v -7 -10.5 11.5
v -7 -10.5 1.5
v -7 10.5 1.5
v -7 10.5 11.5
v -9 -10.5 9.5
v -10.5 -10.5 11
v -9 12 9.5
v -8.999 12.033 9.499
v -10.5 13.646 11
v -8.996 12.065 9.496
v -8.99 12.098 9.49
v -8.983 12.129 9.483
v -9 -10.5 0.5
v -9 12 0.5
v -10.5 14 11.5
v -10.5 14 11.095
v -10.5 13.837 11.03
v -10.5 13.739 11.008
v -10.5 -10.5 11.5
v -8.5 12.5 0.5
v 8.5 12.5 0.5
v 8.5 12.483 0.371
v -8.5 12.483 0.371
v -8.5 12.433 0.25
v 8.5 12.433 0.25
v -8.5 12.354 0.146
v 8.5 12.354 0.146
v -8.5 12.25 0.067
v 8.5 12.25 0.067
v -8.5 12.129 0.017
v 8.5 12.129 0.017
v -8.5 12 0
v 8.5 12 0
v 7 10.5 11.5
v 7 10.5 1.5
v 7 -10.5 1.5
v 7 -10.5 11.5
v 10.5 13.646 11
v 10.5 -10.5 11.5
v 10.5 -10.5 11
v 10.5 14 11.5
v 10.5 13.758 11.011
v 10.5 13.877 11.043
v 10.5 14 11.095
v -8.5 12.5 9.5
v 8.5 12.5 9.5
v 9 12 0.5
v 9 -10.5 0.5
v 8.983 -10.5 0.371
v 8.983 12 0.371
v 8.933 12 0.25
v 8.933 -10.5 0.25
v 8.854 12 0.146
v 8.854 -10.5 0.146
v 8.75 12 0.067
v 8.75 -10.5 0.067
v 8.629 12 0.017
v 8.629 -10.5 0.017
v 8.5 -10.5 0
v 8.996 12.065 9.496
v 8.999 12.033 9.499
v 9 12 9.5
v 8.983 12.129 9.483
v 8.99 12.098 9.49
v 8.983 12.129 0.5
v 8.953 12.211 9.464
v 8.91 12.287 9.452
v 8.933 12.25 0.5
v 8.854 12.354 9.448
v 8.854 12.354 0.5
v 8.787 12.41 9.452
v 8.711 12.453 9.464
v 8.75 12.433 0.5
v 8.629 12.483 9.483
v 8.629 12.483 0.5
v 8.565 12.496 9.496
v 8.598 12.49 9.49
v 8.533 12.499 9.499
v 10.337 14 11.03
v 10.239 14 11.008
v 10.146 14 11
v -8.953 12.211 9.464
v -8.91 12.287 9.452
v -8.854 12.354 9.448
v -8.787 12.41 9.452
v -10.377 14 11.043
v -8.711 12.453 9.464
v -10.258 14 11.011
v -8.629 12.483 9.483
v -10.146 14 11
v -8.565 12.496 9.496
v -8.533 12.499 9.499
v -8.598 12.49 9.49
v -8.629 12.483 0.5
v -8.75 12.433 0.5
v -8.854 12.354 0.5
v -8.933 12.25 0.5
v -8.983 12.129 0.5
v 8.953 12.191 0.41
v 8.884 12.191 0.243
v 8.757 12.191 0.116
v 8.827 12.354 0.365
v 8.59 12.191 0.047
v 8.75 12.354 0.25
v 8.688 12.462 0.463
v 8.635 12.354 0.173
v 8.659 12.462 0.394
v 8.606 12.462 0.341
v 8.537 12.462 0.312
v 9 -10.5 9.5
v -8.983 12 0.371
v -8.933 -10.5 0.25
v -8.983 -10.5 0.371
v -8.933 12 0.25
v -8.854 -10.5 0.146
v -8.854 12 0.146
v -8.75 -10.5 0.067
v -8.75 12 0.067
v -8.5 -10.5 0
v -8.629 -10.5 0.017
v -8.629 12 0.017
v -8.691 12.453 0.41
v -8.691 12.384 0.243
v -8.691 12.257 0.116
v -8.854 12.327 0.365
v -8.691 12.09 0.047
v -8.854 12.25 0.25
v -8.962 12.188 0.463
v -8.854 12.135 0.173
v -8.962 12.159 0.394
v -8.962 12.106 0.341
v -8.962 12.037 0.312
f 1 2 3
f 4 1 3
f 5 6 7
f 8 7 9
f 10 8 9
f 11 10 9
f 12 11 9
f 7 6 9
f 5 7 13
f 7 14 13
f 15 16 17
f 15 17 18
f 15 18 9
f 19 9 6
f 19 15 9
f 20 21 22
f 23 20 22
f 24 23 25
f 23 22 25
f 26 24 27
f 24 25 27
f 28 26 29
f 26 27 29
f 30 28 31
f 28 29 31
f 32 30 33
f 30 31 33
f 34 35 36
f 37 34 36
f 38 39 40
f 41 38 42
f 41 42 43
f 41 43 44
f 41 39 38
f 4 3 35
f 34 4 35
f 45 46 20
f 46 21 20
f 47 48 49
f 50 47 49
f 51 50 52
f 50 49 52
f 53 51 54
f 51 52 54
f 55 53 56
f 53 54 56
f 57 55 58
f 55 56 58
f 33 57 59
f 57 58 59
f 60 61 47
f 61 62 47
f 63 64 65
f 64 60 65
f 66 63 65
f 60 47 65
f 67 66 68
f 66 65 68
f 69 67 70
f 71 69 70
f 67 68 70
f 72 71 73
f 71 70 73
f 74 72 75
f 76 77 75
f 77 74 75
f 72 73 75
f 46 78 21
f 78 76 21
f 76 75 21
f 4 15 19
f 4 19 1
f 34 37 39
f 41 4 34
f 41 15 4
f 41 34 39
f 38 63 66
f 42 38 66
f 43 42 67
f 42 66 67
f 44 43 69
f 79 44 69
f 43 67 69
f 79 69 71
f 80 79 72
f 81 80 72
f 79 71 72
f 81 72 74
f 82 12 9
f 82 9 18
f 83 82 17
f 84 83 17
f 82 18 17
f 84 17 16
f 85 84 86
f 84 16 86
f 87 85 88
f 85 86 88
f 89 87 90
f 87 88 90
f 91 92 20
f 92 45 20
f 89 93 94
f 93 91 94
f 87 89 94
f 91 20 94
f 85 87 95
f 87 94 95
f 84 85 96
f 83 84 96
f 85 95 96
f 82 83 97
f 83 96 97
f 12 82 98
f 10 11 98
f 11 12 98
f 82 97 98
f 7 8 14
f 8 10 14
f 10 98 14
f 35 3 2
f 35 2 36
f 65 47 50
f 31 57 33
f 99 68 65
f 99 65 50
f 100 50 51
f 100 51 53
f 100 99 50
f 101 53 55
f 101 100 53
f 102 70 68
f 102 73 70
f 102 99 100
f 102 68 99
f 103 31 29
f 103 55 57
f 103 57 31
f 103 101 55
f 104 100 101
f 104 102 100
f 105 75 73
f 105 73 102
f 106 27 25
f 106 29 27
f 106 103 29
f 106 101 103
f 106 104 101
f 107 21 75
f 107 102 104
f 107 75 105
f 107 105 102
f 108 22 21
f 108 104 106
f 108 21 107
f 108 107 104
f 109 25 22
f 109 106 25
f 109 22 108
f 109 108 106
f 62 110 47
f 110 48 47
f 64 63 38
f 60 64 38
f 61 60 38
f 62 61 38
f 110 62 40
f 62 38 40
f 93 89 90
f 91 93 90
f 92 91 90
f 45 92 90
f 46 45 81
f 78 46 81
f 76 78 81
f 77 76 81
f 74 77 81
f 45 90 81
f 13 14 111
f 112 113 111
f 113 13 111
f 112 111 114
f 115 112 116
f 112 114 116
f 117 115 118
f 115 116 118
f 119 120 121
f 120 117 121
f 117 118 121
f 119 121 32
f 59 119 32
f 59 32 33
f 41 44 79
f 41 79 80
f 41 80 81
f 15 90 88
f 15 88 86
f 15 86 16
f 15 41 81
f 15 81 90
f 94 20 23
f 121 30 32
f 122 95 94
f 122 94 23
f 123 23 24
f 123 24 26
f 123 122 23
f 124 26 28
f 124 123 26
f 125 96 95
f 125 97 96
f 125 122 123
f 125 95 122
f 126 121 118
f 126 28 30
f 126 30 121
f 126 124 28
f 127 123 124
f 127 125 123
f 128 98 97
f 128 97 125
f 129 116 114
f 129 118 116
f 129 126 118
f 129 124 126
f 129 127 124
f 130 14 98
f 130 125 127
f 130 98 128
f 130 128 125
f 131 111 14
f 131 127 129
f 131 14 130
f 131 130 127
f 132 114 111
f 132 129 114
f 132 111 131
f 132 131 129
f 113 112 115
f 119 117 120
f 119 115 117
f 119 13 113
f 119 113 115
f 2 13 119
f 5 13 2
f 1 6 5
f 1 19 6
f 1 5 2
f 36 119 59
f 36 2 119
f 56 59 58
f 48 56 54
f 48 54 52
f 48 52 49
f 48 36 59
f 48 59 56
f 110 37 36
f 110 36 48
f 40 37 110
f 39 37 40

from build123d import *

# Parameters (mm, degrees)
SKETCH1_W           = 14
SKETCH1_H           = 21
BOSS_EXTRUDE1_DEPTH = 1.5
BOSS_EXTRUDE2_DEPTH = 11.5
BOSS_EXTRUDE3_DEPTH = 0.5
CHAMFER1_SIZE       = 1.5
FILLET1_R           = 0.5


# Some blends are built 0.0001 mm under size
with BuildPart() as part:
    # Sketch1 → Boss-Extrude1 (new body)
    with BuildSketch(Plane.XY):
        Rectangle(SKETCH1_W, SKETCH1_H)
    extrude(amount=BOSS_EXTRUDE1_DEPTH)

    # Sketch1<4> → Boss-Extrude2 (add)
    with BuildSketch(Plane.XY):
        Polygon((-9, 12.5), (-9, -10.5), (-7, -10.5), (-7, 10.5), (7, 10.5), (7, -10.5), (9, -10.5), (9, 12.5), align=None)
    extrude(amount=BOSS_EXTRUDE2_DEPTH)

    # Sketch2 → Boss-Extrude3 (add)
    with BuildSketch(Plane.XY.offset(11.5)):
        Polygon((-9, -10.5), (-9, 12.5), (9, 12.5), (9, -10.5), (10.5, -10.5), (10.5, 14), (-10.5, 14), (-10.5, -10.5), align=None)
    extrude(amount=-BOSS_EXTRUDE3_DEPTH)

    # Chamfer1
    chamfer1_edges = [part.edges().sort_by_distance(p)[0] for p in [
        (-9, 1, 11),
        (0, 12.5, 11),
        (9, 1, 11),
    ]]
    chamfer(chamfer1_edges, length=CHAMFER1_SIZE - 0.0001)  # a hair under: the kernel refuses the full size

    # Fillet1
    # the kernel refuses this fillet: 0.5 mm, written as the material it takes off along each edge
    with BuildSketch(Plane(origin=(8.5, 12, 0.5), x_dir=(0, 0, -1), z_dir=(0, 1, 0))) as fillet1_piece_1_section:
        Polygon((0, 0), (FILLET1_R * 1.02, 0), (FILLET1_R * 1.02, -FILLET1_R * 1.02), (0, -FILLET1_R * 1.02), align=None)
    fillet1_piece_1 = extrude(amount=FILLET1_R * 1.02, mode=Mode.PRIVATE)
    fillet1_piece_1 = fillet1_piece_1 - Plane(origin=(8.5, 12, 0.5), x_dir=(-0.7071067811865475, 0, 0.7071067811865475), z_dir=(0, 1, 0)) * Sphere(FILLET1_R, mode=Mode.PRIVATE)
    add(fillet1_piece_1, mode=Mode.SUBTRACT)
    with BuildSketch(Plane(origin=(-8.5, 12, 0.5), x_dir=(0, 0, -1), z_dir=(-1, 0, 0))) as fillet1_piece_2_section:
        Polygon((0, 0), (FILLET1_R * 1.02, 0), (FILLET1_R * 1.02, -FILLET1_R * 1.02), (0, -FILLET1_R * 1.02), align=None)
    fillet1_piece_2 = extrude(amount=FILLET1_R * 1.02, mode=Mode.PRIVATE)
    fillet1_piece_2 = fillet1_piece_2 - Plane(origin=(-8.5, 12, 0.5), x_dir=(0, -0.7071067811865475, 0.7071067811865475), z_dir=(-1, 0, 0)) * Sphere(FILLET1_R, mode=Mode.PRIVATE)
    add(fillet1_piece_2, mode=Mode.SUBTRACT)
    with BuildSketch(Plane(origin=(9, -11.75, 0), x_dir=(-1, 0, 0), z_dir=(0, 1, 0))) as fillet1_piece_3:
        with BuildLine():
            CenterArc((FILLET1_R, FILLET1_R), FILLET1_R, 180, 90)
            Line((0, FILLET1_R), (-FILLET1_R * 0.02, FILLET1_R))
            Line((-FILLET1_R * 0.02, FILLET1_R), (-FILLET1_R * 0.02, -FILLET1_R * 0.02))
            Line((-FILLET1_R * 0.02, -FILLET1_R * 0.02), (FILLET1_R, -FILLET1_R * 0.02))
            Line((FILLET1_R, -FILLET1_R * 0.02), (FILLET1_R, 0))
        make_face()
    extrude(amount=23.75, mode=Mode.SUBTRACT)
    with BuildSketch(Plane(origin=(-9, 12, 0), x_dir=(0, 0, 1), z_dir=(0, -1, 0))) as fillet1_piece_4:
        with BuildLine():
            CenterArc((FILLET1_R, -FILLET1_R), FILLET1_R, 90, 90)
            Line((0, -FILLET1_R), (-FILLET1_R * 0.02, -FILLET1_R))
            Line((-FILLET1_R * 0.02, -FILLET1_R), (-FILLET1_R * 0.02, FILLET1_R * 0.02))
            Line((-FILLET1_R * 0.02, FILLET1_R * 0.02), (FILLET1_R, FILLET1_R * 0.02))
            Line((FILLET1_R, FILLET1_R * 0.02), (FILLET1_R, 0))
        make_face()
    extrude(amount=23.75, mode=Mode.SUBTRACT)
    with BuildSketch(Plane(origin=(8.5, 12.5, 0), x_dir=(0, -1, 0), z_dir=(-1, 0, 0))) as fillet1_piece_5:
        with BuildLine():
            CenterArc((FILLET1_R, FILLET1_R), FILLET1_R, 180, 90)
            Line((0, FILLET1_R), (-FILLET1_R * 0.02, FILLET1_R))
            Line((-FILLET1_R * 0.02, FILLET1_R), (-FILLET1_R * 0.02, -FILLET1_R * 0.02))
            Line((-FILLET1_R * 0.02, -FILLET1_R * 0.02), (FILLET1_R, -FILLET1_R * 0.02))
            Line((FILLET1_R, -FILLET1_R * 0.02), (FILLET1_R, 0))
        make_face()
    extrude(amount=17, mode=Mode.SUBTRACT)
    with BuildSketch(Plane(origin=(-9, 12.5, 0.5), x_dir=(0, -1, 0), z_dir=(0, 0, 1))) as fillet1_piece_6_section:
        with BuildLine():
            CenterArc((FILLET1_R, FILLET1_R), FILLET1_R, 180, 90)
            Line((0, FILLET1_R), (-FILLET1_R * 0.02, FILLET1_R))
            Line((-FILLET1_R * 0.02, FILLET1_R), (-FILLET1_R * 0.02, -FILLET1_R * 0.02))
            Line((-FILLET1_R * 0.02, -FILLET1_R * 0.02), (FILLET1_R, -FILLET1_R * 0.02))
            Line((FILLET1_R, -FILLET1_R * 0.02), (FILLET1_R, 0))
        make_face()
    fillet1_piece_6 = extrude(amount=10.2501, mode=Mode.PRIVATE)
    fillet1_piece_6 = split(fillet1_piece_6, bisect_by=Plane(origin=(-6.646616443, 12.387329395, 7.146716443), z_dir=(-0.7071067811865476, 0, -0.7071067811865476)), keep=Keep.TOP, mode=Mode.PRIVATE)
    fillet1_piece_6 = split(fillet1_piece_6, bisect_by=Plane(origin=(-8.887329395, 10.146616443, 7.146716443), z_dir=(0, 0.7071067811865476, -0.7071067811865476)), keep=Keep.TOP, mode=Mode.PRIVATE)
    add(fillet1_piece_6, mode=Mode.SUBTRACT)
    with BuildSketch(Plane(origin=(-9, 12.5, 0.5), x_dir=(0, -1, 0), z_dir=(0, 0, 1))) as fillet1_piece_7_section:
        with BuildLine():
            CenterArc((FILLET1_R, FILLET1_R), FILLET1_R, 180, 90)
            Line((0, FILLET1_R), (-FILLET1_R * 0.02, FILLET1_R))
            Line((-FILLET1_R * 0.02, FILLET1_R), (-FILLET1_R * 0.02, -FILLET1_R * 0.02))
            Line((-FILLET1_R * 0.02, -FILLET1_R * 0.02), (FILLET1_R, -FILLET1_R * 0.02))
            Line((FILLET1_R, -FILLET1_R * 0.02), (FILLET1_R, 0))
        make_face()
    fillet1_piece_7 = extrude(amount=10.2501, mode=Mode.PRIVATE)
    fillet1_piece_7 = split(fillet1_piece_7, bisect_by=Plane(origin=(-8.796279433, 12.478509021, 9.296379433), z_dir=(0.7071067811865476, 0, 0.7071067811865476)), keep=Keep.TOP, mode=Mode.PRIVATE)
    fillet1_piece_7 = split(fillet1_piece_7, bisect_by=Plane(origin=(-8.735536236, 12.417765825, 9.417865825), z_dir=(0, 0.7071067811865476, -0.7071067811865476)), keep=Keep.TOP, mode=Mode.PRIVATE)
    add(fillet1_piece_7, mode=Mode.SUBTRACT)
    with BuildSketch(Plane(origin=(-9, 12.5, 0.5), x_dir=(0, -1, 0), z_dir=(0, 0, 1))) as fillet1_piece_8_section:
        with BuildLine():
            CenterArc((FILLET1_R, FILLET1_R), FILLET1_R, 180, 90)
            Line((0, FILLET1_R), (-FILLET1_R * 0.02, FILLET1_R))
            Line((-FILLET1_R * 0.02, FILLET1_R), (-FILLET1_R * 0.02, -FILLET1_R * 0.02))
            Line((-FILLET1_R * 0.02, -FILLET1_R * 0.02), (FILLET1_R, -FILLET1_R * 0.02))
            Line((FILLET1_R, -FILLET1_R * 0.02), (FILLET1_R, 0))
        make_face()
    fillet1_piece_8 = extrude(amount=10.2501, mode=Mode.PRIVATE)
    fillet1_piece_8 = split(fillet1_piece_8, bisect_by=Plane(origin=(-8.917765825, 12.235536236, 9.417865825), z_dir=(-0.7071067811865476, 0, -0.7071067811865476)), keep=Keep.TOP, mode=Mode.PRIVATE)
    fillet1_piece_8 = split(fillet1_piece_8, bisect_by=Plane(origin=(-8.978509021, 12.296279433, 9.296379433), z_dir=(0, -0.7071067811865476, 0.7071067811865476)), keep=Keep.TOP, mode=Mode.PRIVATE)
    add(fillet1_piece_8, mode=Mode.SUBTRACT)
    with BuildSketch(Plane(origin=(9, 12.5, 0.5), x_dir=(0, -1, 0), z_dir=(0, 0, 1))) as fillet1_piece_9_section:
        with BuildLine():
            CenterArc((FILLET1_R, -FILLET1_R), FILLET1_R, 90, 90)
            Line((0, -FILLET1_R), (-FILLET1_R * 0.02, -FILLET1_R))
            Line((-FILLET1_R * 0.02, -FILLET1_R), (-FILLET1_R * 0.02, FILLET1_R * 0.02))
            Line((-FILLET1_R * 0.02, FILLET1_R * 0.02), (FILLET1_R, FILLET1_R * 0.02))
            Line((FILLET1_R, FILLET1_R * 0.02), (FILLET1_R, 0))
        make_face()
    fillet1_piece_9 = extrude(amount=10.2501, mode=Mode.PRIVATE)
    fillet1_piece_9 = split(fillet1_piece_9, bisect_by=Plane(origin=(6.646616443, 12.387329395, 7.146716443), z_dir=(0.7071067811865476, 0, -0.7071067811865476)), keep=Keep.TOP, mode=Mode.PRIVATE)
    fillet1_piece_9 = split(fillet1_piece_9, bisect_by=Plane(origin=(8.887329395, 10.146616443, 7.146716443), z_dir=(0, 0.7071067811865476, -0.7071067811865476)), keep=Keep.TOP, mode=Mode.PRIVATE)
    add(fillet1_piece_9, mode=Mode.SUBTRACT)
    with BuildSketch(Plane(origin=(9, 12.5, 0.5), x_dir=(0, -1, 0), z_dir=(0, 0, 1))) as fillet1_piece_10_section:
        with BuildLine():
            CenterArc((FILLET1_R, -FILLET1_R), FILLET1_R, 90, 90)
            Line((0, -FILLET1_R), (-FILLET1_R * 0.02, -FILLET1_R))
            Line((-FILLET1_R * 0.02, -FILLET1_R), (-FILLET1_R * 0.02, FILLET1_R * 0.02))
            Line((-FILLET1_R * 0.02, FILLET1_R * 0.02), (FILLET1_R, FILLET1_R * 0.02))
            Line((FILLET1_R, FILLET1_R * 0.02), (FILLET1_R, 0))
        make_face()
    fillet1_piece_10 = extrude(amount=10.2501, mode=Mode.PRIVATE)
    fillet1_piece_10 = split(fillet1_piece_10, bisect_by=Plane(origin=(8.796279433, 12.478509021, 9.296379433), z_dir=(-0.7071067811865476, 0, 0.7071067811865476)), keep=Keep.TOP, mode=Mode.PRIVATE)
    fillet1_piece_10 = split(fillet1_piece_10, bisect_by=Plane(origin=(8.735536236, 12.417765825, 9.417865825), z_dir=(0, 0.7071067811865476, -0.7071067811865476)), keep=Keep.TOP, mode=Mode.PRIVATE)
    add(fillet1_piece_10, mode=Mode.SUBTRACT)
    with BuildSketch(Plane(origin=(9, 12.5, 0.5), x_dir=(0, -1, 0), z_dir=(0, 0, 1))) as fillet1_piece_11_section:
        with BuildLine():
            CenterArc((FILLET1_R, -FILLET1_R), FILLET1_R, 90, 90)
            Line((0, -FILLET1_R), (-FILLET1_R * 0.02, -FILLET1_R))
            Line((-FILLET1_R * 0.02, -FILLET1_R), (-FILLET1_R * 0.02, FILLET1_R * 0.02))
            Line((-FILLET1_R * 0.02, FILLET1_R * 0.02), (FILLET1_R, FILLET1_R * 0.02))
            Line((FILLET1_R, FILLET1_R * 0.02), (FILLET1_R, 0))
        make_face()
    fillet1_piece_11 = extrude(amount=10.2501, mode=Mode.PRIVATE)
    fillet1_piece_11 = split(fillet1_piece_11, bisect_by=Plane(origin=(8.917765825, 12.235536236, 9.417865825), z_dir=(0.7071067811865476, 0, -0.7071067811865476)), keep=Keep.TOP, mode=Mode.PRIVATE)
    fillet1_piece_11 = split(fillet1_piece_11, bisect_by=Plane(origin=(8.978509021, 12.296279433, 9.296379433), z_dir=(0, -0.7071067811865476, 0.7071067811865476)), keep=Keep.TOP, mode=Mode.PRIVATE)
    add(fillet1_piece_11, mode=Mode.SUBTRACT)
    with BuildSketch(Plane(origin=(8.583333333, 12.083333333, 9.083433333), x_dir=(0.408248290463863, -0.816496580927726, 0.408248290463863), z_dir=(0.5773502691896258, 0.5773502691896258, 0.5773502691896258))) as fillet1_piece_12_section:
        with BuildLine():
            CenterArc((FILLET1_R * 0.57735026919, -FILLET1_R), FILLET1_R, 90, 60)
            Line((-FILLET1_R * 0.288675134595, -FILLET1_R * 0.5), (-FILLET1_R * 0.305995642671, -FILLET1_R * 0.49))
            Line((-FILLET1_R * 0.305995642671, -FILLET1_R * 0.49), (-FILLET1_R * 0.0115470053838, FILLET1_R * 0.02))
            Line((-FILLET1_R * 0.0115470053838, FILLET1_R * 0.02), (FILLET1_R * 0.57735026919, FILLET1_R * 0.02))
            Line((FILLET1_R * 0.57735026919, FILLET1_R * 0.02), (FILLET1_R * 0.57735026919, 0))
        make_face()
    fillet1_piece_12 = extrude(amount=4.041278679, mode=Mode.PRIVATE)
    fillet1_piece_12 = split(fillet1_piece_12, bisect_by=Plane(origin=(9, 12.593724218, 9.60103013), z_dir=(-1, 0, 0)), keep=Keep.TOP, mode=Mode.PRIVATE)
    fillet1_piece_12 = split(fillet1_piece_12, bisect_by=Plane(origin=(8.906275782, 12.5, 9.60103013), z_dir=(0, 1, 0)), keep=Keep.TOP, mode=Mode.PRIVATE)
    add(fillet1_piece_12, mode=Mode.SUBTRACT)
    with BuildSketch(Plane(origin=(8.583333333, 12.083333333, 9.083433333), x_dir=(0.408248290463863, -0.816496580927726, 0.408248290463863), z_dir=(0.5773502691896258, 0.5773502691896258, 0.5773502691896258))) as fillet1_piece_13_section:
        with BuildLine():
            CenterArc((FILLET1_R * 0.57735026919, -FILLET1_R), FILLET1_R, 90, 60)
            Line((-FILLET1_R * 0.288675134595, -FILLET1_R * 0.5), (-FILLET1_R * 0.305995642671, -FILLET1_R * 0.49))
            Line((-FILLET1_R * 0.305995642671, -FILLET1_R * 0.49), (-FILLET1_R * 0.0115470053838, FILLET1_R * 0.02))
            Line((-FILLET1_R * 0.0115470053838, FILLET1_R * 0.02), (FILLET1_R * 0.57735026919, FILLET1_R * 0.02))
            Line((FILLET1_R * 0.57735026919, FILLET1_R * 0.02), (FILLET1_R * 0.57735026919, 0))
        make_face()
    fillet1_piece_13 = extrude(amount=4.041278679, mode=Mode.PRIVATE)
    fillet1_piece_13 = split(fillet1_piece_13, bisect_by=Plane(origin=(9, 12.406275782, 9.60103013), z_dir=(1, 0, 0)), keep=Keep.TOP, mode=Mode.PRIVATE)
    fillet1_piece_13 = split(fillet1_piece_13, bisect_by=Plane(origin=(9.093724218, 12.5, 9.60103013), z_dir=(0, -1, 0)), keep=Keep.TOP, mode=Mode.PRIVATE)
    add(fillet1_piece_13, mode=Mode.SUBTRACT)
    with BuildSketch(Plane(origin=(8.583333333, 12.083333333, 9.083433333), x_dir=(0.408248290463863, -0.816496580927726, 0.408248290463863), z_dir=(0.5773502691896258, 0.5773502691896258, 0.5773502691896258))) as fillet1_piece_14_section:
        with BuildLine():
            CenterArc((FILLET1_R * 0.57735026919, -FILLET1_R), FILLET1_R, 90, 60)
            Line((-FILLET1_R * 0.288675134595, -FILLET1_R * 0.5), (-FILLET1_R * 0.305995642671, -FILLET1_R * 0.49))
            Line((-FILLET1_R * 0.305995642671, -FILLET1_R * 0.49), (-FILLET1_R * 0.0115470053838, FILLET1_R * 0.02))
            Line((-FILLET1_R * 0.0115470053838, FILLET1_R * 0.02), (FILLET1_R * 0.57735026919, FILLET1_R * 0.02))
            Line((FILLET1_R * 0.57735026919, FILLET1_R * 0.02), (FILLET1_R * 0.57735026919, 0))
        make_face()
    fillet1_piece_14 = extrude(amount=4.041278679, mode=Mode.PRIVATE)
    fillet1_piece_14 = split(fillet1_piece_14, bisect_by=Plane(origin=(9.74076552, 13.24076552, 11), z_dir=(0, 0, -1)), keep=Keep.TOP, mode=Mode.PRIVATE)
    fillet1_piece_14 = split(fillet1_piece_14, bisect_by=Plane(origin=(9, 13.24076552, 10.315388184), z_dir=(1, 0, 0)), keep=Keep.TOP, mode=Mode.PRIVATE)
    fillet1_piece_14 = split(fillet1_piece_14, bisect_by=Plane(origin=(9.74076552, 12.5, 10.315388184), z_dir=(0, 1, 0)), keep=Keep.TOP, mode=Mode.PRIVATE)
    add(fillet1_piece_14, mode=Mode.SUBTRACT)
    with BuildSketch(Plane(origin=(8.583333333, 12.083333333, 9.083433333), x_dir=(0.408248290463863, -0.816496580927726, 0.408248290463863), z_dir=(0.5773502691896258, 0.5773502691896258, 0.5773502691896258))) as fillet1_piece_15_section:
        with BuildLine():
            CenterArc((FILLET1_R * 0.57735026919, -FILLET1_R), FILLET1_R, 90, 60)
            Line((-FILLET1_R * 0.288675134595, -FILLET1_R * 0.5), (-FILLET1_R * 0.305995642671, -FILLET1_R * 0.49))
            Line((-FILLET1_R * 0.305995642671, -FILLET1_R * 0.49), (-FILLET1_R * 0.0115470053838, FILLET1_R * 0.02))
            Line((-FILLET1_R * 0.0115470053838, FILLET1_R * 0.02), (FILLET1_R * 0.57735026919, FILLET1_R * 0.02))
            Line((FILLET1_R * 0.57735026919, FILLET1_R * 0.02), (FILLET1_R * 0.57735026919, 0))
        make_face()
    fillet1_piece_15 = extrude(amount=4.041278679, mode=Mode.PRIVATE)
    fillet1_piece_15 = split(fillet1_piece_15, bisect_by=Plane(origin=(10.655826111, 14.155826111, 11), z_dir=(0, 0, 1)), keep=Keep.TOP, mode=Mode.PRIVATE)
    add(fillet1_piece_15, mode=Mode.SUBTRACT)
    with BuildSketch(Plane(origin=(-10.916566667, 14.416566667, 11.416666667), x_dir=(-0.40824829046386607, -0.816496580927726, 0.4082482904638599), z_dir=(0.5773502691896258, -0.5773502691896258, -0.5773502691896258))) as fillet1_piece_16_section:
        with BuildLine():
            CenterArc((FILLET1_R * 0.57735026919, -FILLET1_R), FILLET1_R, 90, 60)
            Line((-FILLET1_R * 0.288675134595, -FILLET1_R * 0.5), (-FILLET1_R * 0.305995642671, -FILLET1_R * 0.49))
            Line((-FILLET1_R * 0.305995642671, -FILLET1_R * 0.49), (-FILLET1_R * 0.0115470053838, FILLET1_R * 0.02))
            Line((-FILLET1_R * 0.0115470053838, FILLET1_R * 0.02), (FILLET1_R * 0.57735026919, FILLET1_R * 0.02))
            Line((FILLET1_R * 0.57735026919, FILLET1_R * 0.02), (FILLET1_R * 0.57735026919, 0))
        make_face()
    fillet1_piece_16 = extrude(amount=4.041278679, mode=Mode.PRIVATE)
    fillet1_piece_16 = split(fillet1_piece_16, bisect_by=Plane(origin=(-10.655826111, 14.155826111, 11), z_dir=(0, 0, 1)), keep=Keep.TOP, mode=Mode.PRIVATE)
    add(fillet1_piece_16, mode=Mode.SUBTRACT)
    with BuildSketch(Plane(origin=(-10.916566667, 14.416566667, 11.416666667), x_dir=(-0.40824829046386607, -0.816496580927726, 0.4082482904638599), z_dir=(0.5773502691896258, -0.5773502691896258, -0.5773502691896258))) as fillet1_piece_17_section:
        with BuildLine():
            CenterArc((FILLET1_R * 0.57735026919, -FILLET1_R), FILLET1_R, 90, 60)
            Line((-FILLET1_R * 0.288675134595, -FILLET1_R * 0.5), (-FILLET1_R * 0.305995642671, -FILLET1_R * 0.49))
            Line((-FILLET1_R * 0.305995642671, -FILLET1_R * 0.49), (-FILLET1_R * 0.0115470053838, FILLET1_R * 0.02))
            Line((-FILLET1_R * 0.0115470053838, FILLET1_R * 0.02), (FILLET1_R * 0.57735026919, FILLET1_R * 0.02))
            Line((FILLET1_R * 0.57735026919, FILLET1_R * 0.02), (FILLET1_R * 0.57735026919, 0))
        make_face()
    fillet1_piece_17 = extrude(amount=4.041278679, mode=Mode.PRIVATE)
    fillet1_piece_17 = split(fillet1_piece_17, bisect_by=Plane(origin=(-9, 13.24076552, 10.315388184), z_dir=(-1, 0, 0)), keep=Keep.TOP, mode=Mode.PRIVATE)
    fillet1_piece_17 = split(fillet1_piece_17, bisect_by=Plane(origin=(-9.74076552, 13.24076552, 11), z_dir=(0, 0, -1)), keep=Keep.TOP, mode=Mode.PRIVATE)
    fillet1_piece_17 = split(fillet1_piece_17, bisect_by=Plane(origin=(-9.74076552, 12.5, 10.315388184), z_dir=(0, 1, 0)), keep=Keep.TOP, mode=Mode.PRIVATE)
    add(fillet1_piece_17, mode=Mode.SUBTRACT)
    with BuildSketch(Plane(origin=(-10.916566667, 14.416566667, 11.416666667), x_dir=(-0.40824829046386607, -0.816496580927726, 0.4082482904638599), z_dir=(0.5773502691896258, -0.5773502691896258, -0.5773502691896258))) as fillet1_piece_18_section:
        with BuildLine():
            CenterArc((FILLET1_R * 0.57735026919, -FILLET1_R), FILLET1_R, 90, 60)
            Line((-FILLET1_R * 0.288675134595, -FILLET1_R * 0.5), (-FILLET1_R * 0.305995642671, -FILLET1_R * 0.49))
            Line((-FILLET1_R * 0.305995642671, -FILLET1_R * 0.49), (-FILLET1_R * 0.0115470053838, FILLET1_R * 0.02))
            Line((-FILLET1_R * 0.0115470053838, FILLET1_R * 0.02), (FILLET1_R * 0.57735026919, FILLET1_R * 0.02))
            Line((FILLET1_R * 0.57735026919, FILLET1_R * 0.02), (FILLET1_R * 0.57735026919, 0))
        make_face()
    fillet1_piece_18 = extrude(amount=4.041278679, mode=Mode.PRIVATE)
    fillet1_piece_18 = split(fillet1_piece_18, bisect_by=Plane(origin=(-9, 12.593724218, 9.60103013), z_dir=(1, 0, 0)), keep=Keep.TOP, mode=Mode.PRIVATE)
    fillet1_piece_18 = split(fillet1_piece_18, bisect_by=Plane(origin=(-8.906275782, 12.5, 9.60103013), z_dir=(0, 1, 0)), keep=Keep.TOP, mode=Mode.PRIVATE)
    add(fillet1_piece_18, mode=Mode.SUBTRACT)
    with BuildSketch(Plane(origin=(-10.916566667, 14.416566667, 11.416666667), x_dir=(-0.40824829046386607, -0.816496580927726, 0.4082482904638599), z_dir=(0.5773502691896258, -0.5773502691896258, -0.5773502691896258))) as fillet1_piece_19_section:
        with BuildLine():
            CenterArc((FILLET1_R * 0.57735026919, -FILLET1_R), FILLET1_R, 90, 60)
            Line((-FILLET1_R * 0.288675134595, -FILLET1_R * 0.5), (-FILLET1_R * 0.305995642671, -FILLET1_R * 0.49))
            Line((-FILLET1_R * 0.305995642671, -FILLET1_R * 0.49), (-FILLET1_R * 0.0115470053838, FILLET1_R * 0.02))
            Line((-FILLET1_R * 0.0115470053838, FILLET1_R * 0.02), (FILLET1_R * 0.57735026919, FILLET1_R * 0.02))
            Line((FILLET1_R * 0.57735026919, FILLET1_R * 0.02), (FILLET1_R * 0.57735026919, 0))
        make_face()
    fillet1_piece_19 = extrude(amount=4.041278679, mode=Mode.PRIVATE)
    fillet1_piece_19 = split(fillet1_piece_19, bisect_by=Plane(origin=(-9, 12.406275782, 9.60103013), z_dir=(-1, 0, 0)), keep=Keep.TOP, mode=Mode.PRIVATE)
    fillet1_piece_19 = split(fillet1_piece_19, bisect_by=Plane(origin=(-9.093724218, 12.5, 9.60103013), z_dir=(0, -1, 0)), keep=Keep.TOP, mode=Mode.PRIVATE)
    add(fillet1_piece_19, mode=Mode.SUBTRACT)
    with BuildSketch(Plane(origin=(-9, 12.5, 0.5), x_dir=(0, -1, 0), z_dir=(0, 0, 1))) as fillet1_piece_20a_section:
        with BuildLine():
            CenterArc((FILLET1_R, FILLET1_R), FILLET1_R, 180, 90)
            Line((0, FILLET1_R), (-FILLET1_R * 0.02, FILLET1_R))
            Line((-FILLET1_R * 0.02, FILLET1_R), (-FILLET1_R * 0.02, -FILLET1_R * 0.02))
            Line((-FILLET1_R * 0.02, -FILLET1_R * 0.02), (FILLET1_R, -FILLET1_R * 0.02))
            Line((FILLET1_R, -FILLET1_R * 0.02), (FILLET1_R, 0))
        make_face()
    fillet1_piece_20a = extrude(amount=10.2501, mode=Mode.PRIVATE)
    fillet1_piece_20a = split(fillet1_piece_20a, bisect_by=Plane(origin=(-9.246323412, 12.386715356, 9.746423412), z_dir=(0.7071067811865476, 0, 0.7071067811865476)), keep=Keep.TOP, mode=Mode.PRIVATE)
    fillet1_piece_20a = split(fillet1_piece_20a, bisect_by=Plane(origin=(-8.886715356, 12.746323412, 9.746423412), z_dir=(0, -0.7071067811865476, 0.7071067811865476)), keep=Keep.TOP, mode=Mode.PRIVATE)
    with BuildSketch(Plane(origin=(-10.916566667, 14.416566667, 11.416666667), x_dir=(-0.40824829046386607, -0.816496580927726, 0.4082482904638599), z_dir=(0.5773502691896258, -0.5773502691896258, -0.5773502691896258))) as fillet1_piece_20b_section:
        with BuildLine():
            CenterArc((FILLET1_R * 0.57735026919, -FILLET1_R), FILLET1_R, 90, 60)
            Line((-FILLET1_R * 0.288675134595, -FILLET1_R * 0.5), (-FILLET1_R * 0.305995642671, -FILLET1_R * 0.49))
            Line((-FILLET1_R * 0.305995642671, -FILLET1_R * 0.49), (-FILLET1_R * 0.0115470053838, FILLET1_R * 0.02))
            Line((-FILLET1_R * 0.0115470053838, FILLET1_R * 0.02), (FILLET1_R * 0.57735026919, FILLET1_R * 0.02))
            Line((FILLET1_R * 0.57735026919, FILLET1_R * 0.02), (FILLET1_R * 0.57735026919, 0))
        make_face()
    fillet1_piece_20b = extrude(amount=4.041278679, mode=Mode.PRIVATE)
    fillet1_piece_20b = split(fillet1_piece_20b, bisect_by=Plane(origin=(-9, 12.25202237, 9.326225221), z_dir=(1, 0, 0)), keep=Keep.TOP, mode=Mode.PRIVATE)
    fillet1_piece_20b = split(fillet1_piece_20b, bisect_by=Plane(origin=(-8.75202237, 12.5, 9.326225221), z_dir=(0, -1, 0)), keep=Keep.TOP, mode=Mode.PRIVATE)
    fillet1_piece_20 = fillet1_piece_20a & fillet1_piece_20b
    add(fillet1_piece_20, mode=Mode.SUBTRACT)
    with BuildSketch(Plane(origin=(9, 12.5, 0.5), x_dir=(0, -1, 0), z_dir=(0, 0, 1))) as fillet1_piece_21a_section:
        with BuildLine():
            CenterArc((FILLET1_R, -FILLET1_R), FILLET1_R, 90, 90)
            Line((0, -FILLET1_R), (-FILLET1_R * 0.02, -FILLET1_R))
            Line((-FILLET1_R * 0.02, -FILLET1_R), (-FILLET1_R * 0.02, FILLET1_R * 0.02))
            Line((-FILLET1_R * 0.02, FILLET1_R * 0.02), (FILLET1_R, FILLET1_R * 0.02))
            Line((FILLET1_R, FILLET1_R * 0.02), (FILLET1_R, 0))
        make_face()
    fillet1_piece_21a = extrude(amount=10.2501, mode=Mode.PRIVATE)
    fillet1_piece_21a = split(fillet1_piece_21a, bisect_by=Plane(origin=(9.246323412, 12.386715356, 9.746423412), z_dir=(-0.7071067811865476, 0, 0.7071067811865476)), keep=Keep.TOP, mode=Mode.PRIVATE)
    fillet1_piece_21a = split(fillet1_piece_21a, bisect_by=Plane(origin=(8.886715356, 12.746323412, 9.746423412), z_dir=(0, -0.7071067811865476, 0.7071067811865476)), keep=Keep.TOP, mode=Mode.PRIVATE)
    with BuildSketch(Plane(origin=(8.583333333, 12.083333333, 9.083433333), x_dir=(0.408248290463863, -0.816496580927726, 0.408248290463863), z_dir=(0.5773502691896258, 0.5773502691896258, 0.5773502691896258))) as fillet1_piece_21b_section:
        with BuildLine():
            CenterArc((FILLET1_R * 0.57735026919, -FILLET1_R), FILLET1_R, 90, 60)
            Line((-FILLET1_R * 0.288675134595, -FILLET1_R * 0.5), (-FILLET1_R * 0.305995642671, -FILLET1_R * 0.49))
            Line((-FILLET1_R * 0.305995642671, -FILLET1_R * 0.49), (-FILLET1_R * 0.0115470053838, FILLET1_R * 0.02))
            Line((-FILLET1_R * 0.0115470053838, FILLET1_R * 0.02), (FILLET1_R * 0.57735026919, FILLET1_R * 0.02))
            Line((FILLET1_R * 0.57735026919, FILLET1_R * 0.02), (FILLET1_R * 0.57735026919, 0))
        make_face()
    fillet1_piece_21b = extrude(amount=4.041278679, mode=Mode.PRIVATE)
    fillet1_piece_21b = split(fillet1_piece_21b, bisect_by=Plane(origin=(9, 12.25202237, 9.326225221), z_dir=(-1, 0, 0)), keep=Keep.TOP, mode=Mode.PRIVATE)
    fillet1_piece_21b = split(fillet1_piece_21b, bisect_by=Plane(origin=(8.75202237, 12.5, 9.326225221), z_dir=(0, -1, 0)), keep=Keep.TOP, mode=Mode.PRIVATE)
    fillet1_piece_21 = fillet1_piece_21a & fillet1_piece_21b
    add(fillet1_piece_21, mode=Mode.SUBTRACT)


solid = part.part
